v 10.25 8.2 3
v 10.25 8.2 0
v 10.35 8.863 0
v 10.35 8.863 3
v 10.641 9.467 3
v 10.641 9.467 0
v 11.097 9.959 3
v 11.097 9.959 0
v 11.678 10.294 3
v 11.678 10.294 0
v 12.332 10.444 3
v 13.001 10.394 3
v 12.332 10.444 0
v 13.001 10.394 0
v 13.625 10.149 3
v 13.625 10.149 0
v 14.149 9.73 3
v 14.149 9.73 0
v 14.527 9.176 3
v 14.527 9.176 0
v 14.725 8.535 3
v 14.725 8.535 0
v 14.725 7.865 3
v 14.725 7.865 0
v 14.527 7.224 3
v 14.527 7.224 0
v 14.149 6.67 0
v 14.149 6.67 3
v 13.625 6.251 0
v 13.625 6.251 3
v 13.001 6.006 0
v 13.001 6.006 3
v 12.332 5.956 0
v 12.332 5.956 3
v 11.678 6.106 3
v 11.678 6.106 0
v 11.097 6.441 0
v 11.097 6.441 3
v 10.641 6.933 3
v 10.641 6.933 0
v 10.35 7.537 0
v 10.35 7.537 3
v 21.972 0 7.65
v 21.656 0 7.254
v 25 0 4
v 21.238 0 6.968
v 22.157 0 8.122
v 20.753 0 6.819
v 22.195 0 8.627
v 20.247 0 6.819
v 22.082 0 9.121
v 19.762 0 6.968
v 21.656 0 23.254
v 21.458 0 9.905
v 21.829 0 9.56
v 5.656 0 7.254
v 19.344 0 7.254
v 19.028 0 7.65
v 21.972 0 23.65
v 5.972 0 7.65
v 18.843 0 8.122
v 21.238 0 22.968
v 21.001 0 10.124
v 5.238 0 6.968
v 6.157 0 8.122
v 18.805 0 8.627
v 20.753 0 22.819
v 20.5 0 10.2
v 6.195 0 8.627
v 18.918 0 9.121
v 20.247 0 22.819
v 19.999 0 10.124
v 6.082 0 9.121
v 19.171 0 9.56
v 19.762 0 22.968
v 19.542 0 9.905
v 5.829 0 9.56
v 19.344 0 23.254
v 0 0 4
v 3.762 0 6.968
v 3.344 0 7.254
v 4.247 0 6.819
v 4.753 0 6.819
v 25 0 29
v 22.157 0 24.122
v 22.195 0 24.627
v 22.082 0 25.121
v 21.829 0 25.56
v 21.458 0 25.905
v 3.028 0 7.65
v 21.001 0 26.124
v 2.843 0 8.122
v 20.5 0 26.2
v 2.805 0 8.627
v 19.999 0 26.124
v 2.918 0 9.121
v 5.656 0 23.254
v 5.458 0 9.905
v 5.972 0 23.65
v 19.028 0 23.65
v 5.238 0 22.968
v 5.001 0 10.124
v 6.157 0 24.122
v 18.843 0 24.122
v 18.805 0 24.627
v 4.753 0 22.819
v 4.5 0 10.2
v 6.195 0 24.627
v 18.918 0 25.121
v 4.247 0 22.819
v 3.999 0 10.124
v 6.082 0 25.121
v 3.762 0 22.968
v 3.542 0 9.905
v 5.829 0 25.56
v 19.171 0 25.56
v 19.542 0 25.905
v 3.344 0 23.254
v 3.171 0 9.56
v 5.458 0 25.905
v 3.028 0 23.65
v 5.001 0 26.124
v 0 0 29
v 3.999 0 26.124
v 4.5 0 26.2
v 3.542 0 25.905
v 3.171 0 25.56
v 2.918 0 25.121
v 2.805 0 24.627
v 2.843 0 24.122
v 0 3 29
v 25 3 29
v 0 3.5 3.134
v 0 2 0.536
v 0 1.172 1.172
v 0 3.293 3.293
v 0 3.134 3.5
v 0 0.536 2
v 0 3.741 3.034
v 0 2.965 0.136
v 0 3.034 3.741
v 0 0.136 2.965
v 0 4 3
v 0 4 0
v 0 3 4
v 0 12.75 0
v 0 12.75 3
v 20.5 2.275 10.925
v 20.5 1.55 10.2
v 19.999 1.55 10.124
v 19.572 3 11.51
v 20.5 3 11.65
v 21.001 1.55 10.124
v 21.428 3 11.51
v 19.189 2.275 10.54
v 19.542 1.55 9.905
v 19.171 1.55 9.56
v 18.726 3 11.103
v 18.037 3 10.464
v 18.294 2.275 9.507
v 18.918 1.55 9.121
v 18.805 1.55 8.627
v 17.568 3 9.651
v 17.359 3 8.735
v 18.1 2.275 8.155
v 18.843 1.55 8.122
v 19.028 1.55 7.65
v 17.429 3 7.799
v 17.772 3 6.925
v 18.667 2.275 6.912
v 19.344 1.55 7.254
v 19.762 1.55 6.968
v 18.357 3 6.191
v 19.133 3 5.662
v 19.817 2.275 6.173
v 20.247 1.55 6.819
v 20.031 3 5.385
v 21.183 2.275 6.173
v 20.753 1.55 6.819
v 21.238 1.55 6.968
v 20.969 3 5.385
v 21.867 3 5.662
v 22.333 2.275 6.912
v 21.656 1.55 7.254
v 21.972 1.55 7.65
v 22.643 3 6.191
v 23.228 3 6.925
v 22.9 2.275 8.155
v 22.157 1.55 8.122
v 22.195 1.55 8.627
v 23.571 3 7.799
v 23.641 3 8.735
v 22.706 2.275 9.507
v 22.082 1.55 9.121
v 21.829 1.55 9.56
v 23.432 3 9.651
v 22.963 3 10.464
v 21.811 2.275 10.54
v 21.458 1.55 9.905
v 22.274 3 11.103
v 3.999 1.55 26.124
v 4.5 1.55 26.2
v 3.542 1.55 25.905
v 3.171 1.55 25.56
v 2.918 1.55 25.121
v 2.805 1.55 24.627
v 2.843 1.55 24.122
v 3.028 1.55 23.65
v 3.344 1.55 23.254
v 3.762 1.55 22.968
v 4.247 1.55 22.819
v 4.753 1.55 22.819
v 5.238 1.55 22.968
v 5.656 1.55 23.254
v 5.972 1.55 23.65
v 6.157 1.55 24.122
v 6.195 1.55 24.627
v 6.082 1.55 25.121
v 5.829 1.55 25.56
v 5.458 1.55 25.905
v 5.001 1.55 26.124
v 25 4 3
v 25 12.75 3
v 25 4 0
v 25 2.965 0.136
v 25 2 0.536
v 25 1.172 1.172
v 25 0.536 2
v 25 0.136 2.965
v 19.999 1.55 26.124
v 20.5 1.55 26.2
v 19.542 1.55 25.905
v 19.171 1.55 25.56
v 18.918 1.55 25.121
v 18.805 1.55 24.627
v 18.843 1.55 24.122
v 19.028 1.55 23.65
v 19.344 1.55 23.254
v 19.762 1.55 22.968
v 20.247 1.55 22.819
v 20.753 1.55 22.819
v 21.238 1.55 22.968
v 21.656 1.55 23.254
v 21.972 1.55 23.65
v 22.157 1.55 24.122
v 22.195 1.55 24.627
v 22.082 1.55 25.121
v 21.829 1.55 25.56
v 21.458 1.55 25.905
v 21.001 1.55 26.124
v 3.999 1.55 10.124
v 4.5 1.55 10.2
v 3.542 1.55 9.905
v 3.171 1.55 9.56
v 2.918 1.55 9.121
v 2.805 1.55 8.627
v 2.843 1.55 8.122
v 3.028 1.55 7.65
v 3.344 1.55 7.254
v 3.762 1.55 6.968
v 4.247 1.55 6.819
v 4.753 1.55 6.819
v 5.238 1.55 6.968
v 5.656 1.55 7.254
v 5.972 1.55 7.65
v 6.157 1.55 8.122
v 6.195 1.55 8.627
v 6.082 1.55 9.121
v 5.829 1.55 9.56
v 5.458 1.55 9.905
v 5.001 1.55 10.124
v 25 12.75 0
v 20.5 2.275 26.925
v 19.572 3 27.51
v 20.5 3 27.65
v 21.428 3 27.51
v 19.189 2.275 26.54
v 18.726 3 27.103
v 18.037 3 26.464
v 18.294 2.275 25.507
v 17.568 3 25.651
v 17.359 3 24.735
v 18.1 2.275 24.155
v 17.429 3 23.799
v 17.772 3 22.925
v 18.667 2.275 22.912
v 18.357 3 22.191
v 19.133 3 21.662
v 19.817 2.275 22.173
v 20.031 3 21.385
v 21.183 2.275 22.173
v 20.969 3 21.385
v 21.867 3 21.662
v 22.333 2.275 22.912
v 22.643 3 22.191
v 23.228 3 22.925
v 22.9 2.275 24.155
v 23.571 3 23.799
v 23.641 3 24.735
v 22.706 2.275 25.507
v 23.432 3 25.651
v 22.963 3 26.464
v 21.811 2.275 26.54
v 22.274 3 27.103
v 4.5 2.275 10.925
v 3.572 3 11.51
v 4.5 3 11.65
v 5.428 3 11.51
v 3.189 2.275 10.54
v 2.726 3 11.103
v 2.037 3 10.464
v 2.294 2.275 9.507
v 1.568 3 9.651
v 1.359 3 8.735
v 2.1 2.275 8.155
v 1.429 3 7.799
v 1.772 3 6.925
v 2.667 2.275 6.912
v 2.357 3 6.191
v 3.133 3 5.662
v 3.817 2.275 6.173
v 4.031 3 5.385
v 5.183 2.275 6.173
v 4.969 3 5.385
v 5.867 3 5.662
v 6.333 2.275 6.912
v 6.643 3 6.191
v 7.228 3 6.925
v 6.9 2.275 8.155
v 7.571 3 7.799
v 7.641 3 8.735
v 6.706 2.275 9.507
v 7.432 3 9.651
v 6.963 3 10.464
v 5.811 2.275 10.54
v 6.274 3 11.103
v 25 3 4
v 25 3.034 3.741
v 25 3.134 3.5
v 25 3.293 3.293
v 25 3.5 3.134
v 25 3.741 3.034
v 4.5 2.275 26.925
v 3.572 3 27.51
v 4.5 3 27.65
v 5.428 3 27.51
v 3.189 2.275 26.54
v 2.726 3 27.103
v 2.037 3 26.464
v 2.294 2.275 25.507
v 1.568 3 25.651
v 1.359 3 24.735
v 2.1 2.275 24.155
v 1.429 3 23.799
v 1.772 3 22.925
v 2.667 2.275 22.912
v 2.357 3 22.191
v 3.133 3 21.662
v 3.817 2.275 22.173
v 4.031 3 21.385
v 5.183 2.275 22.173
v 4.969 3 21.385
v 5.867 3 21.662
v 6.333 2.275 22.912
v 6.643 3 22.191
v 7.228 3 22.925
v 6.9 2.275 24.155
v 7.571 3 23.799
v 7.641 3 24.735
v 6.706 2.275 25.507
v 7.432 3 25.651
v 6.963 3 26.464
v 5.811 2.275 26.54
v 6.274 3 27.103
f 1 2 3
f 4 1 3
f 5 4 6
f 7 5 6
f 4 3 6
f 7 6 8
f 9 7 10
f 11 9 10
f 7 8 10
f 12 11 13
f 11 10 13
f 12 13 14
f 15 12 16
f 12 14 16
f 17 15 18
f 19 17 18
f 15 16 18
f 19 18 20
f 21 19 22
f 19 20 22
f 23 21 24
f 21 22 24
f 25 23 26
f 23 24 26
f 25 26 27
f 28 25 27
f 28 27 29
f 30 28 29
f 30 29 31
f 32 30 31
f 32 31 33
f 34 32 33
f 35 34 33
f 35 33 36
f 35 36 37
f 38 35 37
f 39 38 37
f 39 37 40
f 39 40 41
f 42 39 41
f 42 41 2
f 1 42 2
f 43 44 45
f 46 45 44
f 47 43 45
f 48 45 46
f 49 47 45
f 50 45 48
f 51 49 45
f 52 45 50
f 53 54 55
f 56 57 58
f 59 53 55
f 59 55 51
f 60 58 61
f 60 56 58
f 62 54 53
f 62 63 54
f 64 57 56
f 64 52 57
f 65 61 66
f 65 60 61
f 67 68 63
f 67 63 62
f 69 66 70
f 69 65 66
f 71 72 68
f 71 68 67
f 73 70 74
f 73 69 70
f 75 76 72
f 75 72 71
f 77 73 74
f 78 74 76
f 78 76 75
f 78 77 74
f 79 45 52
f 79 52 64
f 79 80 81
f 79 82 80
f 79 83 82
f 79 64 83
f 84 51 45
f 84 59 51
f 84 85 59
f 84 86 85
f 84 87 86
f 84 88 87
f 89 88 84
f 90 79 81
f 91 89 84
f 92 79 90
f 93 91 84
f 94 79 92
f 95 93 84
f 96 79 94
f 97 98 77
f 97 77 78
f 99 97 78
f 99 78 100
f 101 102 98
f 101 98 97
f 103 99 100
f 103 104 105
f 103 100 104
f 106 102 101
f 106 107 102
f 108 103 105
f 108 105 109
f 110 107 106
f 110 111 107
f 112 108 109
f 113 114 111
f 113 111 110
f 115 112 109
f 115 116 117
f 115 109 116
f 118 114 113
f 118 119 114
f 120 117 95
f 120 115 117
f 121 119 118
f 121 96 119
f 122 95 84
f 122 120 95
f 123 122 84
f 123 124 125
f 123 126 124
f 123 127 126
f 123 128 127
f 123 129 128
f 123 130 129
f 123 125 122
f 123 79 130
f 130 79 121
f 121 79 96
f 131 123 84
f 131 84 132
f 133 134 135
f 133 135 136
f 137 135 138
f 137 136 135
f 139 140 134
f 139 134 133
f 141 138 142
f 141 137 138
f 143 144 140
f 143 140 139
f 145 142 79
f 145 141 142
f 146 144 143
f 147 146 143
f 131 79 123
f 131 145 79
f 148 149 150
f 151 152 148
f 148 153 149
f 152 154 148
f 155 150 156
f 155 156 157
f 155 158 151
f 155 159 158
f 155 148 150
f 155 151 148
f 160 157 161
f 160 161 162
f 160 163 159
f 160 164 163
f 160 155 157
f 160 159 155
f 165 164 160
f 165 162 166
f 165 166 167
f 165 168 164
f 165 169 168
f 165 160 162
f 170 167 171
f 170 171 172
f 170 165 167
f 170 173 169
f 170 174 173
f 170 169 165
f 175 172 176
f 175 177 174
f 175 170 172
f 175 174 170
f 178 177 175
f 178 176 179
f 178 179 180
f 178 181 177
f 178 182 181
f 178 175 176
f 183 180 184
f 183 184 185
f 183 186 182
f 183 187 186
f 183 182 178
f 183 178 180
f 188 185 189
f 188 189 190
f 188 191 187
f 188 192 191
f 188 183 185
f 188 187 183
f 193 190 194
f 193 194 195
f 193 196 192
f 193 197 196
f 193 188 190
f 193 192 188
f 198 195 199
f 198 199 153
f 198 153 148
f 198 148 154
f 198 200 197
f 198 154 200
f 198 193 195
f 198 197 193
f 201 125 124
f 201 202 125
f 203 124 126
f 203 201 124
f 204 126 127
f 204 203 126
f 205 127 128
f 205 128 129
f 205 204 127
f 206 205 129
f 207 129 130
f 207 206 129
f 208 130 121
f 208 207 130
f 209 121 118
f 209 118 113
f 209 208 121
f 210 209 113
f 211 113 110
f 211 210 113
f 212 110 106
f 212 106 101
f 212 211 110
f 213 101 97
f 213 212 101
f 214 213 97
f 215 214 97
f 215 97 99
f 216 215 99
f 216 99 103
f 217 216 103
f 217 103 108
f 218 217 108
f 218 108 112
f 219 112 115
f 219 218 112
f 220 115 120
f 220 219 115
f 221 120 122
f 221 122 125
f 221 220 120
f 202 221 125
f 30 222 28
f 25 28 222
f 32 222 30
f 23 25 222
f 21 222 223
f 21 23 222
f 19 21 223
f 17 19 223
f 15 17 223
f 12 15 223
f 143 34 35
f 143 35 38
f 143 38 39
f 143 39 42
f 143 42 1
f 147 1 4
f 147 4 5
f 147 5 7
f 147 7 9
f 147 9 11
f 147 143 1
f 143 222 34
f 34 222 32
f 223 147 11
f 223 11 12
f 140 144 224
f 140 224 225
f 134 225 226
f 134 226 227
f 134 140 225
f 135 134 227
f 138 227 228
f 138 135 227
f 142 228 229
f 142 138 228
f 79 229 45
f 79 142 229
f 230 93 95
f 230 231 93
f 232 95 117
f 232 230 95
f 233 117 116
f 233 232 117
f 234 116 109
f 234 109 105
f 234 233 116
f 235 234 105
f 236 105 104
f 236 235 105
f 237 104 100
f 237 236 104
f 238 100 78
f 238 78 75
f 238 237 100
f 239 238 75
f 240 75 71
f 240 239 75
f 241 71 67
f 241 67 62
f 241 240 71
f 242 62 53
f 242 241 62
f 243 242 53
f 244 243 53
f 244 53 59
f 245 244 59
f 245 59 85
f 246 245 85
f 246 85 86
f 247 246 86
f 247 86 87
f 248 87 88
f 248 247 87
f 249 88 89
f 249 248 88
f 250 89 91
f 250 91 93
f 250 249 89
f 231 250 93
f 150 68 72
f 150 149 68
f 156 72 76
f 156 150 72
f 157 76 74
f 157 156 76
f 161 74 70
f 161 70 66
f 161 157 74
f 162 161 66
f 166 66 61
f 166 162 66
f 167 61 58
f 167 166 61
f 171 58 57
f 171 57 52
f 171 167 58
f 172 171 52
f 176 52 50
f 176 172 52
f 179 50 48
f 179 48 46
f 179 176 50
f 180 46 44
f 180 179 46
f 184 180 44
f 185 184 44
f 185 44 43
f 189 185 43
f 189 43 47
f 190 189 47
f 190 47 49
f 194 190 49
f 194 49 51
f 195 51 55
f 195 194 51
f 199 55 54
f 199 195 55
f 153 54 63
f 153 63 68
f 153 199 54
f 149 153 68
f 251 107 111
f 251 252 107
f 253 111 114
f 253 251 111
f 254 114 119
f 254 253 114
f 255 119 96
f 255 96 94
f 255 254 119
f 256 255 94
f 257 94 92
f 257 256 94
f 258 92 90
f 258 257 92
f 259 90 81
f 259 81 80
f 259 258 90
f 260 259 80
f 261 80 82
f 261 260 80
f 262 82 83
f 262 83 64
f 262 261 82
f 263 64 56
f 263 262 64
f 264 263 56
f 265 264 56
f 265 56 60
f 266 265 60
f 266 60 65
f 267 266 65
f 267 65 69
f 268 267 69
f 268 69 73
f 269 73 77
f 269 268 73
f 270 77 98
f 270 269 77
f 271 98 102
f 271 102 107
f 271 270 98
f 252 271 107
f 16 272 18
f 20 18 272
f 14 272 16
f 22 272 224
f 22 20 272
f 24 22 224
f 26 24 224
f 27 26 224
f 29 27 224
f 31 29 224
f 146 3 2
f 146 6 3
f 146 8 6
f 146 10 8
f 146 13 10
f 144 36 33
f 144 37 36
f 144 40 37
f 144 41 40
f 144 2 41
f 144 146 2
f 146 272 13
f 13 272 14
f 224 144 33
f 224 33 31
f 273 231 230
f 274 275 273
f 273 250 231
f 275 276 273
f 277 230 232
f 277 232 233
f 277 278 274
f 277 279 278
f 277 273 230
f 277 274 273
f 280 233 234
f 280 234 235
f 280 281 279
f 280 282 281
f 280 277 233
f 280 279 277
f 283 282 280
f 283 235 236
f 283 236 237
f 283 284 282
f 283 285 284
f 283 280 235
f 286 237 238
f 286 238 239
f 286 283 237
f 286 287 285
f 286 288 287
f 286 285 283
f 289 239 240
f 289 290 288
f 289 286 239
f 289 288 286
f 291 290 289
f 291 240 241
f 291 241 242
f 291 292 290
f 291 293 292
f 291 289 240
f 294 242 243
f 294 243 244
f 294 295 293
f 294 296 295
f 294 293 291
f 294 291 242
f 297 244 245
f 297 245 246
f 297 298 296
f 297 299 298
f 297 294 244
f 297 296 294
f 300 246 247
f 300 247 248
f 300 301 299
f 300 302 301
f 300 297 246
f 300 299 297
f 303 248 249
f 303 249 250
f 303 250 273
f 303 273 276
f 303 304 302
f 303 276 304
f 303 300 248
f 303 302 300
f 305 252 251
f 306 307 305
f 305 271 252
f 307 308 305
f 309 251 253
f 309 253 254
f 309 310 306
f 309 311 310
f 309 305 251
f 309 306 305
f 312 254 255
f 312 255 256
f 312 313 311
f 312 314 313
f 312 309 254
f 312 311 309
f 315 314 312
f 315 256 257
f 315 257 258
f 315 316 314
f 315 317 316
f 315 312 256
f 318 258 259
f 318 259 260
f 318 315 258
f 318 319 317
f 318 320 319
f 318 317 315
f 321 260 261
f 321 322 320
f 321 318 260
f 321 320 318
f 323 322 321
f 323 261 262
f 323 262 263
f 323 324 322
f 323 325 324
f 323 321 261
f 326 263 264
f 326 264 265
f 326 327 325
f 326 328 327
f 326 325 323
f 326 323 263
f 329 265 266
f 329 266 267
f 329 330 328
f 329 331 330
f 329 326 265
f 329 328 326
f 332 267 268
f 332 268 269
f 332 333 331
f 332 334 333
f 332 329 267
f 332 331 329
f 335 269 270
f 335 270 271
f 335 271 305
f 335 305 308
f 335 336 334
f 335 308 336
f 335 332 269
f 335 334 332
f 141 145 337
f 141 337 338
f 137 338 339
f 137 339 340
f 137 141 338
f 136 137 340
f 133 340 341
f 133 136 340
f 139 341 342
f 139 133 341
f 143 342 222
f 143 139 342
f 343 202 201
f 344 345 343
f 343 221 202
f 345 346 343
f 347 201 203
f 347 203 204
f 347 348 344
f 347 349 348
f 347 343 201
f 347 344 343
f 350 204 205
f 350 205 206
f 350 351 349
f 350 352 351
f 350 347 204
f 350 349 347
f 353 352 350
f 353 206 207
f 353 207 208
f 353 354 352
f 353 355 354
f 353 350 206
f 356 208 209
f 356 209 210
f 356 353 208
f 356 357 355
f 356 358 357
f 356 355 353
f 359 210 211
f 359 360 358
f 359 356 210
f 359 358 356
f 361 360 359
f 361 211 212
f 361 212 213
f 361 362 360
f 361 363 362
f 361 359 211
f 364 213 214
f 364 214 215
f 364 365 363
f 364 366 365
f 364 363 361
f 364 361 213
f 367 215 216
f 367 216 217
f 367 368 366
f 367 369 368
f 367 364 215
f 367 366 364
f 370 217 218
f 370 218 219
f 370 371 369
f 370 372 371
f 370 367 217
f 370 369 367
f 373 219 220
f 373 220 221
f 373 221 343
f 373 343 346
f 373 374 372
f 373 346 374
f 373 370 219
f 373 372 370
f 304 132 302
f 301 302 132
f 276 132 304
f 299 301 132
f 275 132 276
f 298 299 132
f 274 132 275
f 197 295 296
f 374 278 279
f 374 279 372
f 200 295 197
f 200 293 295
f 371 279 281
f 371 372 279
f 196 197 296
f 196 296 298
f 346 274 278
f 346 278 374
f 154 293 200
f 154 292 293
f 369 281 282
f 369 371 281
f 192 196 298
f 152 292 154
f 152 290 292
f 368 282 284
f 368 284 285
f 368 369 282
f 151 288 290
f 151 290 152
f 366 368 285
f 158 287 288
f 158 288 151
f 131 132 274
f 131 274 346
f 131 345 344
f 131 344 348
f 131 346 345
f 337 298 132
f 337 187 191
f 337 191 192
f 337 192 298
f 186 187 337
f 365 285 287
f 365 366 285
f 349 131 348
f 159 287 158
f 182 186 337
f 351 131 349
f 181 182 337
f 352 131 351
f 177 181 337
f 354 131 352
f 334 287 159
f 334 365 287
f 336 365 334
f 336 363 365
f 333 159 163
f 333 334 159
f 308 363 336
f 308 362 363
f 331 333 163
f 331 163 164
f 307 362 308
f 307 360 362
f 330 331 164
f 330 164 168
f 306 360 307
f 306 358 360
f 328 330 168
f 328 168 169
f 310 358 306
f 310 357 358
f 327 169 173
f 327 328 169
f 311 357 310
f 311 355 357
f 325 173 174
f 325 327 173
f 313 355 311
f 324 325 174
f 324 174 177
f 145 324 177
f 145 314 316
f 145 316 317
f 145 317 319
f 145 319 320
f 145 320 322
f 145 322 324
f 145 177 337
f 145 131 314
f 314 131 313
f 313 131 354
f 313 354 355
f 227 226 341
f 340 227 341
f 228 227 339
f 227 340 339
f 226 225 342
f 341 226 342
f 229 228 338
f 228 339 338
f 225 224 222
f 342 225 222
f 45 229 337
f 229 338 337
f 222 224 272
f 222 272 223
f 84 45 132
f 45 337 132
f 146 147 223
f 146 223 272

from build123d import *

# Parameters (mm, degrees)
T_LE_DE_BASE_PLI_E1_DEPTH                   = 25
FRAISAGE_POUR_VIS_T_TE_FRAIS_E_M31_AT_COUNT = 2
FRAISAGE_POUR_VIS_T_TE_FRAIS_E_M31_AT_PITCH = 16
FRAISAGE_POUR_VIS_T_TE_FRAIS_E_M31_2_COUNT  = 2
FRAISAGE_POUR_VIS_T_TE_FRAIS_E_M31_2_PITCH  = 22.627416998
FRAISAGE_POUR_VIS_T_TE_FRAIS_E_M31_3_COUNT  = 2
FRAISAGE_POUR_VIS_T_TE_FRAIS_E_M31_3_PITCH  = 16
D_GAGEMENT_M41_D                            = 4.5


# Sheet-metal steps are written as plain solids
with BuildPart() as part:
    # Esquisse1 → Tôle de base pliée1 (new body)
    with BuildSketch(Plane(origin=(0, 0, 0), x_dir=(0, 0, -1), z_dir=(1, 0, 0))):
        with BuildLine():
            Line((0, 12.75), (0, 4))
            ThreePointArc((0, 4), (-1.171572875, 1.171572875), (-4, 0))
            Line((-4, 0), (-29, 0))
            Line((-29, 0), (-29, 3))
            Line((-29, 3), (-4, 3))
            ThreePointArc((-4, 3), (-3.292893219, 3.292893219), (-3, 4))
            Line((-3, 4), (-3, 12.75))
            Line((-3, 12.75), (0, 12.75))
        make_face()
    extrude(amount=T_LE_DE_BASE_PLI_E1_DEPTH)

    # Esquisse7 → Fraisage pour vis à tête fraisée M31 (revolve, cut)
    with BuildSketch(Plane(origin=(4.5, 3, 24.5), x_dir=(0, 0, 1), z_dir=(1, 0, 0))):
        Polygon((0, 0), (0, 3), (1.7, 3), (1.7, 1.45), (3.15, 0), align=None)
    fraisage_pour_vis_t_te_frais_e_m31 = revolve(axis=Axis((4.5, 9.35, 24.5), (0, -1, 0)), mode=Mode.SUBTRACT)

    # Fraisage pour vis à tête fraisée M31 at: Fraisage pour vis à tête fraisée M31 ×2
    with Locations(*[(0, 0, -i * FRAISAGE_POUR_VIS_T_TE_FRAIS_E_M31_AT_PITCH) for i in range(1, FRAISAGE_POUR_VIS_T_TE_FRAIS_E_M31_AT_COUNT)]):
        add(fraisage_pour_vis_t_te_frais_e_m31, mode=Mode.SUBTRACT)

    # Fraisage pour vis _ t_te frais_e M31 2: Fraisage pour vis à tête fraisée M31 ×2
    with Locations(*[Vector(0.7071067811865476, 0, -0.7071067811865476) * (i * FRAISAGE_POUR_VIS_T_TE_FRAIS_E_M31_2_PITCH) for i in range(1, FRAISAGE_POUR_VIS_T_TE_FRAIS_E_M31_2_COUNT)]):
        add(fraisage_pour_vis_t_te_frais_e_m31, mode=Mode.SUBTRACT)

    # Fraisage pour vis _ t_te frais_e M31 3: Fraisage pour vis à tête fraisée M31 ×2
    with Locations(*[(i * FRAISAGE_POUR_VIS_T_TE_FRAIS_E_M31_3_PITCH, 0, 0) for i in range(1, FRAISAGE_POUR_VIS_T_TE_FRAIS_E_M31_3_COUNT)]):
        add(fraisage_pour_vis_t_te_frais_e_m31, mode=Mode.SUBTRACT)

    # Dégagement M41 (through all)
    with Locations(Plane.XY.offset(3)):
        with Locations((12.5, 8.2)):
            Hole(D_GAGEMENT_M41_D / 2)


solid = part.part
